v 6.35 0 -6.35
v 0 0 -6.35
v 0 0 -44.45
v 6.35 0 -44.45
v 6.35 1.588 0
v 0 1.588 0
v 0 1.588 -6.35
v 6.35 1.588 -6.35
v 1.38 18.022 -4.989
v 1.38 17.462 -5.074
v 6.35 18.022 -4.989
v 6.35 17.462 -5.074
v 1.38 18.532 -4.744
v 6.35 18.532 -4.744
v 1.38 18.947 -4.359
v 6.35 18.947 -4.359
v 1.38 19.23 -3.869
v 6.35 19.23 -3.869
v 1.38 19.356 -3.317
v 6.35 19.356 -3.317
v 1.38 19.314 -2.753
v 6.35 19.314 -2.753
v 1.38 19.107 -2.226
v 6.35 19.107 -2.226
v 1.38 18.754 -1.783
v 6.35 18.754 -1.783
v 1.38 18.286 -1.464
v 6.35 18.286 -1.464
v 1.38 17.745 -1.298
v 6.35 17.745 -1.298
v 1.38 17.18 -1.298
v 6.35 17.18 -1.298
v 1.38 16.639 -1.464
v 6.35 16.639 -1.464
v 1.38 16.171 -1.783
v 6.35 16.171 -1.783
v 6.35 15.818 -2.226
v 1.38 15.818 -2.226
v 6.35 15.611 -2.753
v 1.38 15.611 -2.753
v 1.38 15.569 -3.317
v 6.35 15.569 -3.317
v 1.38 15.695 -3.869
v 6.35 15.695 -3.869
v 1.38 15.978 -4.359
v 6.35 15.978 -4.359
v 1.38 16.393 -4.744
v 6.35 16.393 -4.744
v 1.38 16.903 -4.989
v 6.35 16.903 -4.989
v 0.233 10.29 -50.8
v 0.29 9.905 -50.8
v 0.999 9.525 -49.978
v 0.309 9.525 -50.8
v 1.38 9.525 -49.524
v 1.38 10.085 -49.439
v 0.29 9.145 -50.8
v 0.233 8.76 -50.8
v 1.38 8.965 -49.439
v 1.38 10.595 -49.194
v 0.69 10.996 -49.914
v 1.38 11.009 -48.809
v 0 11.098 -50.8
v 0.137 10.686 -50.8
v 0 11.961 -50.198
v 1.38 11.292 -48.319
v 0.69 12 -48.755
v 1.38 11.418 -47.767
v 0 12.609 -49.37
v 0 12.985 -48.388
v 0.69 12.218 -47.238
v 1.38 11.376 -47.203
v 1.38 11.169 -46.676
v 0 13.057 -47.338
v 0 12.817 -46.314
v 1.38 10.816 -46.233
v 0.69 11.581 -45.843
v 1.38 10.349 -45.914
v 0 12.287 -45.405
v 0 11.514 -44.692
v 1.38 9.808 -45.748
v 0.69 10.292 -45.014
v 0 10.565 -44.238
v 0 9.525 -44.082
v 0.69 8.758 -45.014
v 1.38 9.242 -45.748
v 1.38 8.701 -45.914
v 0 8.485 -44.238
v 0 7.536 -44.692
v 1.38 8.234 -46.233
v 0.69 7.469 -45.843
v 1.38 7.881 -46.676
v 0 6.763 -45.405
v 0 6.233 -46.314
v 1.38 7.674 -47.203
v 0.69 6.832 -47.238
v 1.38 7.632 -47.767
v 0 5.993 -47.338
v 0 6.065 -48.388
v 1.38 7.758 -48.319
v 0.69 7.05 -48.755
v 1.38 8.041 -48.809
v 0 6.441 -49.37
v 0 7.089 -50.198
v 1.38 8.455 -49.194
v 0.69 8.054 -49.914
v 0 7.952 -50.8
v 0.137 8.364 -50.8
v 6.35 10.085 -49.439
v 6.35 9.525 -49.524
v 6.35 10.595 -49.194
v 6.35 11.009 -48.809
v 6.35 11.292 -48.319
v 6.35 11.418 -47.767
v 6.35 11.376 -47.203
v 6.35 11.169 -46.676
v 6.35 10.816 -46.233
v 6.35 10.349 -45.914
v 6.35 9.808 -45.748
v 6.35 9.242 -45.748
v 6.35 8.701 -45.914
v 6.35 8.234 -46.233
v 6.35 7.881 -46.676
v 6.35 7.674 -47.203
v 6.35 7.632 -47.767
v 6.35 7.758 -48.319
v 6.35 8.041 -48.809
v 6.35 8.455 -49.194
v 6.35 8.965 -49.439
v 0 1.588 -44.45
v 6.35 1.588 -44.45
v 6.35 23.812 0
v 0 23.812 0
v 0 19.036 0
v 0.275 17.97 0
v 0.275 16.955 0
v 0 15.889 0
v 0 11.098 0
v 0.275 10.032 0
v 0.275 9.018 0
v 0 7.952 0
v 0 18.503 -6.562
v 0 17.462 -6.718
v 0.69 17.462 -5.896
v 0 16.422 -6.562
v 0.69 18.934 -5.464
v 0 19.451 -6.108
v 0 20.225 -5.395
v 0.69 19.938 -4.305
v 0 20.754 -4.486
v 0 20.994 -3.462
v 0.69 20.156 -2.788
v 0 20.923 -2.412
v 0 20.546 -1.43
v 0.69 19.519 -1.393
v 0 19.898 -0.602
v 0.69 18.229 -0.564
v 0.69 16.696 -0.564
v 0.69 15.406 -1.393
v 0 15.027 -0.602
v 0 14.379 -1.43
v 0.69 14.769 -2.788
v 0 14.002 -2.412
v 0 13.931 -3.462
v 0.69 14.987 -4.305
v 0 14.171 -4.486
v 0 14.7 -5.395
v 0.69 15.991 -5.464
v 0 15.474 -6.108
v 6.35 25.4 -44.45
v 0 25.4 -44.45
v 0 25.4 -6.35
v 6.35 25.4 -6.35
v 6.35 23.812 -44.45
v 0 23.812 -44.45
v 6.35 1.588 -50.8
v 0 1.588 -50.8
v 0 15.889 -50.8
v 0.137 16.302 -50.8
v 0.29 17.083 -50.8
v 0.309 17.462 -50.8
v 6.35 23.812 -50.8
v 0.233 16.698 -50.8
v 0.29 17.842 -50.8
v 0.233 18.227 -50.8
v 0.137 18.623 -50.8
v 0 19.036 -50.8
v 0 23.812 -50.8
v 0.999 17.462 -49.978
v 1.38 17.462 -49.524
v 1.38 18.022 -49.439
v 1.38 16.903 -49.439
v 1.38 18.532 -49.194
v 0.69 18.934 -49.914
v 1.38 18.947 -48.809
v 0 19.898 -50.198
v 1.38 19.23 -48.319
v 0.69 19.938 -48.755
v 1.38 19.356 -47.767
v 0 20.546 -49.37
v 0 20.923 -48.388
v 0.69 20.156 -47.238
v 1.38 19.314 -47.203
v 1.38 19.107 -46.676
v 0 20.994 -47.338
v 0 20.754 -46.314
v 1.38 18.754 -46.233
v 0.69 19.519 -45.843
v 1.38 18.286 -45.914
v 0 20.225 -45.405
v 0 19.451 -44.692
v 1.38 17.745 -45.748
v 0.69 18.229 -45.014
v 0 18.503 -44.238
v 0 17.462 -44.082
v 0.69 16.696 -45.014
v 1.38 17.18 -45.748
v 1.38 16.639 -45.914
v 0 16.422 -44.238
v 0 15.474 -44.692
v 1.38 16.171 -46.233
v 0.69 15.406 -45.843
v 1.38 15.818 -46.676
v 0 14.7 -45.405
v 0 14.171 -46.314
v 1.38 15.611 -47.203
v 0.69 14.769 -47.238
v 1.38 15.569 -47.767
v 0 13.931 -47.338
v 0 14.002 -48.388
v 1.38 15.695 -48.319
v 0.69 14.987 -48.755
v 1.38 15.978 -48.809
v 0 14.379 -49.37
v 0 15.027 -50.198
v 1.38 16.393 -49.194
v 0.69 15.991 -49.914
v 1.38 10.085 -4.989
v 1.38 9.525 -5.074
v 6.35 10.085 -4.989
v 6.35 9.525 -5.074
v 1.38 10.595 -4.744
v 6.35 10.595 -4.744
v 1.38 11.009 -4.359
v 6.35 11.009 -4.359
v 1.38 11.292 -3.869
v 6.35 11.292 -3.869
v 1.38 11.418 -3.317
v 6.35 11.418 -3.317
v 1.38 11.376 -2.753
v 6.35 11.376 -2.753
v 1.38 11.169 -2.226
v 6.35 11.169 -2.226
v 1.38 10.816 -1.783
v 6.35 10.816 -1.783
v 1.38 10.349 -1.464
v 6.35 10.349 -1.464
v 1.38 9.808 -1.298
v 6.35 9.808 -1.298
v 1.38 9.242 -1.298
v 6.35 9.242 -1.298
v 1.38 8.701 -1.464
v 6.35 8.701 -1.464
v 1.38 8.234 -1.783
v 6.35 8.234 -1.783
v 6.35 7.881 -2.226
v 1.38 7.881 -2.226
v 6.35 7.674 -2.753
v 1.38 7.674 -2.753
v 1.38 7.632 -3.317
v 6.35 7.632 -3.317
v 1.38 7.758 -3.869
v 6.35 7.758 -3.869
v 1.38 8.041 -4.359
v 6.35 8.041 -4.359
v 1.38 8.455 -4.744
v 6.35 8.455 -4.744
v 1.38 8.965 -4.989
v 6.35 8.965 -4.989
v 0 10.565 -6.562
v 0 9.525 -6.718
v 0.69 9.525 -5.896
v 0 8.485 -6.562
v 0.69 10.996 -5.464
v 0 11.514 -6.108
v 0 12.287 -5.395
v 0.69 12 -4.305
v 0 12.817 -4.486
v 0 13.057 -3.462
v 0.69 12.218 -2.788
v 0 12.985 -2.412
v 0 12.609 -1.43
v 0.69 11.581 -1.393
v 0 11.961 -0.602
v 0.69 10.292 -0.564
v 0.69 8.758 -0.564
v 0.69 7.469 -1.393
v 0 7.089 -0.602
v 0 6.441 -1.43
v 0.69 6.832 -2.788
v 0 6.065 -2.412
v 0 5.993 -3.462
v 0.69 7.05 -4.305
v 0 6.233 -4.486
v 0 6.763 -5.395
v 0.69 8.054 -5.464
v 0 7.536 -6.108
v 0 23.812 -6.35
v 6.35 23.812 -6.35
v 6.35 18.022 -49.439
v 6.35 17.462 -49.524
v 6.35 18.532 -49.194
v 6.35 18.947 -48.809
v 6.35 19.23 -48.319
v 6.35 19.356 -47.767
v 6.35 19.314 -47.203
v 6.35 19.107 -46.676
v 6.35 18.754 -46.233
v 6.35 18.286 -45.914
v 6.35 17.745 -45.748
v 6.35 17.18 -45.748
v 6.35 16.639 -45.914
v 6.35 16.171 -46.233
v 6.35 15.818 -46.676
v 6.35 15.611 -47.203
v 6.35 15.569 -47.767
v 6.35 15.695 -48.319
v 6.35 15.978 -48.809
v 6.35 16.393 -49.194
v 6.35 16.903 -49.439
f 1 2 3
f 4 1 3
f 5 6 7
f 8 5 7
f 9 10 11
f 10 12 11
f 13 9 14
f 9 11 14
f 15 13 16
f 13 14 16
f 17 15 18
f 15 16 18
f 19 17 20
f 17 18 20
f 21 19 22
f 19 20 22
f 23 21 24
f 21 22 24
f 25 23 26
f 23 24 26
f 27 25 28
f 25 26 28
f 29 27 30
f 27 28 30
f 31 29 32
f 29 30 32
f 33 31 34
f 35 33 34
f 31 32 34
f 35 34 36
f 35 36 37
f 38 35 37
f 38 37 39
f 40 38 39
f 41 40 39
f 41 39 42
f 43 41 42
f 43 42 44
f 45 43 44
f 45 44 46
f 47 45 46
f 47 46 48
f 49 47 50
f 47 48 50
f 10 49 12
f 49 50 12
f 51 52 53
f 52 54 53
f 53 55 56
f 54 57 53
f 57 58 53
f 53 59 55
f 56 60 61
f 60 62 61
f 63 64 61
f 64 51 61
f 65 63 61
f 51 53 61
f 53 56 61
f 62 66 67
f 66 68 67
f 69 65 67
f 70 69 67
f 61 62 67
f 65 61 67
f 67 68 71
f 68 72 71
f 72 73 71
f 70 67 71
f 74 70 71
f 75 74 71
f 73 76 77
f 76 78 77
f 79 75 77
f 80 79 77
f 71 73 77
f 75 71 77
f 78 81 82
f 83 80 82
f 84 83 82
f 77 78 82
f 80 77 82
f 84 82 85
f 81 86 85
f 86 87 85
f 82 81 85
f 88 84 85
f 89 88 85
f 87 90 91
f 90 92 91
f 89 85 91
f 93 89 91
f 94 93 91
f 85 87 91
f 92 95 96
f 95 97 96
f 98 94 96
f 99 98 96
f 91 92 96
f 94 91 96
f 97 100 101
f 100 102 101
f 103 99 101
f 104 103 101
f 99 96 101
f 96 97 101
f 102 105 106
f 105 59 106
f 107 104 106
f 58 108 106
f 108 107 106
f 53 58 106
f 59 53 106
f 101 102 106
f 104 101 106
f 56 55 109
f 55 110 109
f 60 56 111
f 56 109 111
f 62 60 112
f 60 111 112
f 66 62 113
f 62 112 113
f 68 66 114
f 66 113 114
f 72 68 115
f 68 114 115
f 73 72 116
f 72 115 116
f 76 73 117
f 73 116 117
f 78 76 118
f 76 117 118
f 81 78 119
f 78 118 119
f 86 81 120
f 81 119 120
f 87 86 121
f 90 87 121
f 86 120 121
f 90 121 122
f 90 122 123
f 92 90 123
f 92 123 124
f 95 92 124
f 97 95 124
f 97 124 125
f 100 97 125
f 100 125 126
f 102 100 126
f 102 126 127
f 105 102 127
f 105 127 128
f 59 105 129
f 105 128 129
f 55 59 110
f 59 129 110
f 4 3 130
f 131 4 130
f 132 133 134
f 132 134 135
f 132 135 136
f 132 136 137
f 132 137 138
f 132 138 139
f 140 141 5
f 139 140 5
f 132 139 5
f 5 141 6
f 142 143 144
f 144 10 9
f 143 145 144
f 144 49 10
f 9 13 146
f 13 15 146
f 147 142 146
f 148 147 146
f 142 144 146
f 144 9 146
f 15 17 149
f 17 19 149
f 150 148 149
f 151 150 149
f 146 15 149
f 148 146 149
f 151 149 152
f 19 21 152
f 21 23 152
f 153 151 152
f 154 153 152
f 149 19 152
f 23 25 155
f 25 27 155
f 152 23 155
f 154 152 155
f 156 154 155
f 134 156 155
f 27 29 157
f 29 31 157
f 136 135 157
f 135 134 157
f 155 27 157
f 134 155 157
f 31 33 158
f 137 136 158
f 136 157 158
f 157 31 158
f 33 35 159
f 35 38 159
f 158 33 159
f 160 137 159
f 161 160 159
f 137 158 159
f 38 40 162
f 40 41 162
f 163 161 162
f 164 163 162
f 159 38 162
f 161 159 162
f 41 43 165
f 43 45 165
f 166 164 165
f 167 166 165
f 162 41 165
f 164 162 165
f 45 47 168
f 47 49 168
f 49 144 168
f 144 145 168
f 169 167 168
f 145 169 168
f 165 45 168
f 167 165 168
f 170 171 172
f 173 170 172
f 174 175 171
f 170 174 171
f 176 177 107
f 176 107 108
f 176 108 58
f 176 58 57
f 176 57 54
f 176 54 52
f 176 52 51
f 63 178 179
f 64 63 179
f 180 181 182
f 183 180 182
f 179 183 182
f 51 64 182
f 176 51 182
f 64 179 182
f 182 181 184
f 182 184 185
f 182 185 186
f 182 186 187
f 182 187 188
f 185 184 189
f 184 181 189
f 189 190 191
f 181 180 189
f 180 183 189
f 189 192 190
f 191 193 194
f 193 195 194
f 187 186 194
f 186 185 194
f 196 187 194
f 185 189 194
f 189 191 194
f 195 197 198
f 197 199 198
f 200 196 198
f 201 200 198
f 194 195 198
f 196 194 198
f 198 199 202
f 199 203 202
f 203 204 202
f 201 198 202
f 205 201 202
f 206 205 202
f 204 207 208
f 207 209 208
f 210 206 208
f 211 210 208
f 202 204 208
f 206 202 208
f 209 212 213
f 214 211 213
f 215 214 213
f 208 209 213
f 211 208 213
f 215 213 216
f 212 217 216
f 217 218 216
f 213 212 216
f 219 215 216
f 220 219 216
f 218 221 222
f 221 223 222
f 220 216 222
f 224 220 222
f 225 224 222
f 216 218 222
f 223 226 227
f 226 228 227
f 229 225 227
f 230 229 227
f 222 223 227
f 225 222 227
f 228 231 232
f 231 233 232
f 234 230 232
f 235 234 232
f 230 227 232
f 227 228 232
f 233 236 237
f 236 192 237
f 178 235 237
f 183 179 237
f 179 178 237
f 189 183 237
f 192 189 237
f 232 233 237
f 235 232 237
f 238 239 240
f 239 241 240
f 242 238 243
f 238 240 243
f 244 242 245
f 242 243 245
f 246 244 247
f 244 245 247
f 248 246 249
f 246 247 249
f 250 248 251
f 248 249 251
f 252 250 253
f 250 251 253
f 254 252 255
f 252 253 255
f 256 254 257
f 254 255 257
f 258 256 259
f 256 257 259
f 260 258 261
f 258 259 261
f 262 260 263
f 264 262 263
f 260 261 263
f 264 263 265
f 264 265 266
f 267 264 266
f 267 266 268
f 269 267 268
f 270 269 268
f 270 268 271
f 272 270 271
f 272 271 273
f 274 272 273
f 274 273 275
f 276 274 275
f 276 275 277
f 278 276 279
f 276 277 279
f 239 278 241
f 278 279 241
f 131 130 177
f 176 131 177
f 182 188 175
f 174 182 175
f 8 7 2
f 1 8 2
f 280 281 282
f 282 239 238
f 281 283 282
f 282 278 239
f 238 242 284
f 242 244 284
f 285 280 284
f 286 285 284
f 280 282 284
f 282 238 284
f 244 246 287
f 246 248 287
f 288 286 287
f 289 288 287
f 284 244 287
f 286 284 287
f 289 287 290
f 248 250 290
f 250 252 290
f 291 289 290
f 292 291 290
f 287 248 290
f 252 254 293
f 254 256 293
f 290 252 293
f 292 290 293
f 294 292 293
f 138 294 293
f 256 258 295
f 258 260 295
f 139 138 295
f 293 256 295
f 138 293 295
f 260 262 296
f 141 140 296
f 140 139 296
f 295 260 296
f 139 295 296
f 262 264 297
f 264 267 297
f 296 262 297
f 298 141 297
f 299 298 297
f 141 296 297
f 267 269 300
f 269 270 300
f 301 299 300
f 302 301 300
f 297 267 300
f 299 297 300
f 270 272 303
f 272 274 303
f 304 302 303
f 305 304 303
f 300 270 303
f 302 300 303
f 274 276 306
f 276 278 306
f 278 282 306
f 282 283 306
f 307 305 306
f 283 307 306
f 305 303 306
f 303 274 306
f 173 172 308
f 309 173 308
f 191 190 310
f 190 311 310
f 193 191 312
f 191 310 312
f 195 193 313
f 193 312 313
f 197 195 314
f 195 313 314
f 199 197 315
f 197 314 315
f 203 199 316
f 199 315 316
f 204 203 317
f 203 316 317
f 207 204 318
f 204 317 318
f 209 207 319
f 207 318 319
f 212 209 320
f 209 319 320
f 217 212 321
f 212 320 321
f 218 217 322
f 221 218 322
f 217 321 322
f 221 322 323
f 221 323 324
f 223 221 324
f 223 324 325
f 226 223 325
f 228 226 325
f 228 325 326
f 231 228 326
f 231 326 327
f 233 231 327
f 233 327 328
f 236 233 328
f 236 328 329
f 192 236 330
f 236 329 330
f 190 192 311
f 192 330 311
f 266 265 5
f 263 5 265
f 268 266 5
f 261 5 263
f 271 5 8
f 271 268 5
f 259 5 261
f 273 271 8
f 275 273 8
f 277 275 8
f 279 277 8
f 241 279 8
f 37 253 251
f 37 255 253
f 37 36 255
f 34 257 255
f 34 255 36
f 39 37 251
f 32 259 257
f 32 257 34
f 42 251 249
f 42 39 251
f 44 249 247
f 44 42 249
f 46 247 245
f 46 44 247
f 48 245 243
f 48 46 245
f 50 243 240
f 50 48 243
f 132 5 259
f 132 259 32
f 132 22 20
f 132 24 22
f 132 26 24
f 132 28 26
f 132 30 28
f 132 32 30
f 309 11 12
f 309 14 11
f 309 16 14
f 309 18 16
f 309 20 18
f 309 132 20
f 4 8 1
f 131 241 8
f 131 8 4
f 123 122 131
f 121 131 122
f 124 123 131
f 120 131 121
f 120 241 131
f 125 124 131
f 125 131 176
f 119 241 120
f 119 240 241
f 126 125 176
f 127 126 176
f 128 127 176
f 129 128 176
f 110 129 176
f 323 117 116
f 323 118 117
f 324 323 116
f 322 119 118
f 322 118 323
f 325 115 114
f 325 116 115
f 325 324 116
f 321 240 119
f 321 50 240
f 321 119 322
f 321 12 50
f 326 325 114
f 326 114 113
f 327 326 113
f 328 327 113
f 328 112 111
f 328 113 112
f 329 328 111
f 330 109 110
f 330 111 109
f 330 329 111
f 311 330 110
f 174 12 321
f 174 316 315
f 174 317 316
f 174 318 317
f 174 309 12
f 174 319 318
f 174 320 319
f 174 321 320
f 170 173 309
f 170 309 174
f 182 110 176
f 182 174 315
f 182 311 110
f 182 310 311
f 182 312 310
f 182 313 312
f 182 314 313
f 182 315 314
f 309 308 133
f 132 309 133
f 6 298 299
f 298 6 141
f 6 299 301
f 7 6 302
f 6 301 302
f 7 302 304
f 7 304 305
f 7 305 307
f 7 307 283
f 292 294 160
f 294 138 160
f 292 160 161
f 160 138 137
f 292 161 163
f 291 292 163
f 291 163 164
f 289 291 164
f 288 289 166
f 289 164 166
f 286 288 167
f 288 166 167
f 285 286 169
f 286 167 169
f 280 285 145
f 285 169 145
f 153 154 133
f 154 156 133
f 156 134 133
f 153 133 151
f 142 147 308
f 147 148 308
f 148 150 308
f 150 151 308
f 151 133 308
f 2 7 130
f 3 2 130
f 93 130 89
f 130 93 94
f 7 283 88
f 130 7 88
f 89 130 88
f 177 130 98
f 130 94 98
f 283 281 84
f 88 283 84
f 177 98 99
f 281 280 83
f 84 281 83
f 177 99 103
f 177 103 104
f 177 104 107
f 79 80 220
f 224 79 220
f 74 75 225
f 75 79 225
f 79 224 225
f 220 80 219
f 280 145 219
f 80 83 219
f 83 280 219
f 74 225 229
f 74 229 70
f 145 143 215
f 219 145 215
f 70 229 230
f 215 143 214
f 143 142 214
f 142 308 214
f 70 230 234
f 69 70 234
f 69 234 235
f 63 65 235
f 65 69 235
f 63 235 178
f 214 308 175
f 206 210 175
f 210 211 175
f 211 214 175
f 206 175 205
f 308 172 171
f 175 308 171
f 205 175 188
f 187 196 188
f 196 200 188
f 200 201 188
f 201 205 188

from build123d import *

# Parameters (mm, degrees)
BOSS_EXTRUDE1_DEPTH                               = 6.35
CSK_FOR_6_FLAT_HEAD_MACHINE_SCREW_100_D           = 3.7973
CSK_FOR_6_FLAT_HEAD_MACHINE_SCREW_100_CSINK_D     = 7.0866
CSK_FOR_6_FLAT_HEAD_MACHINE_SCREW_100_CSINK_ANGLE = 100


with BuildPart() as part:
    # Sketch1 → Boss-Extrude1 (new body)
    with BuildSketch(Plane(origin=(0, 0, 0), x_dir=(0, 0, -1), z_dir=(1, 0, 0))):
        Polygon((44.45, 25.4), (6.35, 25.4), (6.35, 23.8125), (0, 23.8125), (0, 1.5875), (6.35, 1.5875), (6.35, 0), (44.45, 0), (44.45, 1.5875), (50.8, 1.5875), (50.8, 23.8125), (44.45, 23.8125), align=None)
    extrude(amount=BOSS_EXTRUDE1_DEPTH)

    # CSK for #6 Flat Head Machine Screw (100)1 (through all)
    with Locations(Plane.ZY):
        with Locations((-47.625, 17.4625), (-47.625, 9.525), (-3.175, 17.4625), (-3.175, 9.525)):
            CounterSinkHole(CSK_FOR_6_FLAT_HEAD_MACHINE_SCREW_100_D / 2, CSK_FOR_6_FLAT_HEAD_MACHINE_SCREW_100_CSINK_D / 2, counter_sink_angle=CSK_FOR_6_FLAT_HEAD_MACHINE_SCREW_100_CSINK_ANGLE)


solid = part.part
